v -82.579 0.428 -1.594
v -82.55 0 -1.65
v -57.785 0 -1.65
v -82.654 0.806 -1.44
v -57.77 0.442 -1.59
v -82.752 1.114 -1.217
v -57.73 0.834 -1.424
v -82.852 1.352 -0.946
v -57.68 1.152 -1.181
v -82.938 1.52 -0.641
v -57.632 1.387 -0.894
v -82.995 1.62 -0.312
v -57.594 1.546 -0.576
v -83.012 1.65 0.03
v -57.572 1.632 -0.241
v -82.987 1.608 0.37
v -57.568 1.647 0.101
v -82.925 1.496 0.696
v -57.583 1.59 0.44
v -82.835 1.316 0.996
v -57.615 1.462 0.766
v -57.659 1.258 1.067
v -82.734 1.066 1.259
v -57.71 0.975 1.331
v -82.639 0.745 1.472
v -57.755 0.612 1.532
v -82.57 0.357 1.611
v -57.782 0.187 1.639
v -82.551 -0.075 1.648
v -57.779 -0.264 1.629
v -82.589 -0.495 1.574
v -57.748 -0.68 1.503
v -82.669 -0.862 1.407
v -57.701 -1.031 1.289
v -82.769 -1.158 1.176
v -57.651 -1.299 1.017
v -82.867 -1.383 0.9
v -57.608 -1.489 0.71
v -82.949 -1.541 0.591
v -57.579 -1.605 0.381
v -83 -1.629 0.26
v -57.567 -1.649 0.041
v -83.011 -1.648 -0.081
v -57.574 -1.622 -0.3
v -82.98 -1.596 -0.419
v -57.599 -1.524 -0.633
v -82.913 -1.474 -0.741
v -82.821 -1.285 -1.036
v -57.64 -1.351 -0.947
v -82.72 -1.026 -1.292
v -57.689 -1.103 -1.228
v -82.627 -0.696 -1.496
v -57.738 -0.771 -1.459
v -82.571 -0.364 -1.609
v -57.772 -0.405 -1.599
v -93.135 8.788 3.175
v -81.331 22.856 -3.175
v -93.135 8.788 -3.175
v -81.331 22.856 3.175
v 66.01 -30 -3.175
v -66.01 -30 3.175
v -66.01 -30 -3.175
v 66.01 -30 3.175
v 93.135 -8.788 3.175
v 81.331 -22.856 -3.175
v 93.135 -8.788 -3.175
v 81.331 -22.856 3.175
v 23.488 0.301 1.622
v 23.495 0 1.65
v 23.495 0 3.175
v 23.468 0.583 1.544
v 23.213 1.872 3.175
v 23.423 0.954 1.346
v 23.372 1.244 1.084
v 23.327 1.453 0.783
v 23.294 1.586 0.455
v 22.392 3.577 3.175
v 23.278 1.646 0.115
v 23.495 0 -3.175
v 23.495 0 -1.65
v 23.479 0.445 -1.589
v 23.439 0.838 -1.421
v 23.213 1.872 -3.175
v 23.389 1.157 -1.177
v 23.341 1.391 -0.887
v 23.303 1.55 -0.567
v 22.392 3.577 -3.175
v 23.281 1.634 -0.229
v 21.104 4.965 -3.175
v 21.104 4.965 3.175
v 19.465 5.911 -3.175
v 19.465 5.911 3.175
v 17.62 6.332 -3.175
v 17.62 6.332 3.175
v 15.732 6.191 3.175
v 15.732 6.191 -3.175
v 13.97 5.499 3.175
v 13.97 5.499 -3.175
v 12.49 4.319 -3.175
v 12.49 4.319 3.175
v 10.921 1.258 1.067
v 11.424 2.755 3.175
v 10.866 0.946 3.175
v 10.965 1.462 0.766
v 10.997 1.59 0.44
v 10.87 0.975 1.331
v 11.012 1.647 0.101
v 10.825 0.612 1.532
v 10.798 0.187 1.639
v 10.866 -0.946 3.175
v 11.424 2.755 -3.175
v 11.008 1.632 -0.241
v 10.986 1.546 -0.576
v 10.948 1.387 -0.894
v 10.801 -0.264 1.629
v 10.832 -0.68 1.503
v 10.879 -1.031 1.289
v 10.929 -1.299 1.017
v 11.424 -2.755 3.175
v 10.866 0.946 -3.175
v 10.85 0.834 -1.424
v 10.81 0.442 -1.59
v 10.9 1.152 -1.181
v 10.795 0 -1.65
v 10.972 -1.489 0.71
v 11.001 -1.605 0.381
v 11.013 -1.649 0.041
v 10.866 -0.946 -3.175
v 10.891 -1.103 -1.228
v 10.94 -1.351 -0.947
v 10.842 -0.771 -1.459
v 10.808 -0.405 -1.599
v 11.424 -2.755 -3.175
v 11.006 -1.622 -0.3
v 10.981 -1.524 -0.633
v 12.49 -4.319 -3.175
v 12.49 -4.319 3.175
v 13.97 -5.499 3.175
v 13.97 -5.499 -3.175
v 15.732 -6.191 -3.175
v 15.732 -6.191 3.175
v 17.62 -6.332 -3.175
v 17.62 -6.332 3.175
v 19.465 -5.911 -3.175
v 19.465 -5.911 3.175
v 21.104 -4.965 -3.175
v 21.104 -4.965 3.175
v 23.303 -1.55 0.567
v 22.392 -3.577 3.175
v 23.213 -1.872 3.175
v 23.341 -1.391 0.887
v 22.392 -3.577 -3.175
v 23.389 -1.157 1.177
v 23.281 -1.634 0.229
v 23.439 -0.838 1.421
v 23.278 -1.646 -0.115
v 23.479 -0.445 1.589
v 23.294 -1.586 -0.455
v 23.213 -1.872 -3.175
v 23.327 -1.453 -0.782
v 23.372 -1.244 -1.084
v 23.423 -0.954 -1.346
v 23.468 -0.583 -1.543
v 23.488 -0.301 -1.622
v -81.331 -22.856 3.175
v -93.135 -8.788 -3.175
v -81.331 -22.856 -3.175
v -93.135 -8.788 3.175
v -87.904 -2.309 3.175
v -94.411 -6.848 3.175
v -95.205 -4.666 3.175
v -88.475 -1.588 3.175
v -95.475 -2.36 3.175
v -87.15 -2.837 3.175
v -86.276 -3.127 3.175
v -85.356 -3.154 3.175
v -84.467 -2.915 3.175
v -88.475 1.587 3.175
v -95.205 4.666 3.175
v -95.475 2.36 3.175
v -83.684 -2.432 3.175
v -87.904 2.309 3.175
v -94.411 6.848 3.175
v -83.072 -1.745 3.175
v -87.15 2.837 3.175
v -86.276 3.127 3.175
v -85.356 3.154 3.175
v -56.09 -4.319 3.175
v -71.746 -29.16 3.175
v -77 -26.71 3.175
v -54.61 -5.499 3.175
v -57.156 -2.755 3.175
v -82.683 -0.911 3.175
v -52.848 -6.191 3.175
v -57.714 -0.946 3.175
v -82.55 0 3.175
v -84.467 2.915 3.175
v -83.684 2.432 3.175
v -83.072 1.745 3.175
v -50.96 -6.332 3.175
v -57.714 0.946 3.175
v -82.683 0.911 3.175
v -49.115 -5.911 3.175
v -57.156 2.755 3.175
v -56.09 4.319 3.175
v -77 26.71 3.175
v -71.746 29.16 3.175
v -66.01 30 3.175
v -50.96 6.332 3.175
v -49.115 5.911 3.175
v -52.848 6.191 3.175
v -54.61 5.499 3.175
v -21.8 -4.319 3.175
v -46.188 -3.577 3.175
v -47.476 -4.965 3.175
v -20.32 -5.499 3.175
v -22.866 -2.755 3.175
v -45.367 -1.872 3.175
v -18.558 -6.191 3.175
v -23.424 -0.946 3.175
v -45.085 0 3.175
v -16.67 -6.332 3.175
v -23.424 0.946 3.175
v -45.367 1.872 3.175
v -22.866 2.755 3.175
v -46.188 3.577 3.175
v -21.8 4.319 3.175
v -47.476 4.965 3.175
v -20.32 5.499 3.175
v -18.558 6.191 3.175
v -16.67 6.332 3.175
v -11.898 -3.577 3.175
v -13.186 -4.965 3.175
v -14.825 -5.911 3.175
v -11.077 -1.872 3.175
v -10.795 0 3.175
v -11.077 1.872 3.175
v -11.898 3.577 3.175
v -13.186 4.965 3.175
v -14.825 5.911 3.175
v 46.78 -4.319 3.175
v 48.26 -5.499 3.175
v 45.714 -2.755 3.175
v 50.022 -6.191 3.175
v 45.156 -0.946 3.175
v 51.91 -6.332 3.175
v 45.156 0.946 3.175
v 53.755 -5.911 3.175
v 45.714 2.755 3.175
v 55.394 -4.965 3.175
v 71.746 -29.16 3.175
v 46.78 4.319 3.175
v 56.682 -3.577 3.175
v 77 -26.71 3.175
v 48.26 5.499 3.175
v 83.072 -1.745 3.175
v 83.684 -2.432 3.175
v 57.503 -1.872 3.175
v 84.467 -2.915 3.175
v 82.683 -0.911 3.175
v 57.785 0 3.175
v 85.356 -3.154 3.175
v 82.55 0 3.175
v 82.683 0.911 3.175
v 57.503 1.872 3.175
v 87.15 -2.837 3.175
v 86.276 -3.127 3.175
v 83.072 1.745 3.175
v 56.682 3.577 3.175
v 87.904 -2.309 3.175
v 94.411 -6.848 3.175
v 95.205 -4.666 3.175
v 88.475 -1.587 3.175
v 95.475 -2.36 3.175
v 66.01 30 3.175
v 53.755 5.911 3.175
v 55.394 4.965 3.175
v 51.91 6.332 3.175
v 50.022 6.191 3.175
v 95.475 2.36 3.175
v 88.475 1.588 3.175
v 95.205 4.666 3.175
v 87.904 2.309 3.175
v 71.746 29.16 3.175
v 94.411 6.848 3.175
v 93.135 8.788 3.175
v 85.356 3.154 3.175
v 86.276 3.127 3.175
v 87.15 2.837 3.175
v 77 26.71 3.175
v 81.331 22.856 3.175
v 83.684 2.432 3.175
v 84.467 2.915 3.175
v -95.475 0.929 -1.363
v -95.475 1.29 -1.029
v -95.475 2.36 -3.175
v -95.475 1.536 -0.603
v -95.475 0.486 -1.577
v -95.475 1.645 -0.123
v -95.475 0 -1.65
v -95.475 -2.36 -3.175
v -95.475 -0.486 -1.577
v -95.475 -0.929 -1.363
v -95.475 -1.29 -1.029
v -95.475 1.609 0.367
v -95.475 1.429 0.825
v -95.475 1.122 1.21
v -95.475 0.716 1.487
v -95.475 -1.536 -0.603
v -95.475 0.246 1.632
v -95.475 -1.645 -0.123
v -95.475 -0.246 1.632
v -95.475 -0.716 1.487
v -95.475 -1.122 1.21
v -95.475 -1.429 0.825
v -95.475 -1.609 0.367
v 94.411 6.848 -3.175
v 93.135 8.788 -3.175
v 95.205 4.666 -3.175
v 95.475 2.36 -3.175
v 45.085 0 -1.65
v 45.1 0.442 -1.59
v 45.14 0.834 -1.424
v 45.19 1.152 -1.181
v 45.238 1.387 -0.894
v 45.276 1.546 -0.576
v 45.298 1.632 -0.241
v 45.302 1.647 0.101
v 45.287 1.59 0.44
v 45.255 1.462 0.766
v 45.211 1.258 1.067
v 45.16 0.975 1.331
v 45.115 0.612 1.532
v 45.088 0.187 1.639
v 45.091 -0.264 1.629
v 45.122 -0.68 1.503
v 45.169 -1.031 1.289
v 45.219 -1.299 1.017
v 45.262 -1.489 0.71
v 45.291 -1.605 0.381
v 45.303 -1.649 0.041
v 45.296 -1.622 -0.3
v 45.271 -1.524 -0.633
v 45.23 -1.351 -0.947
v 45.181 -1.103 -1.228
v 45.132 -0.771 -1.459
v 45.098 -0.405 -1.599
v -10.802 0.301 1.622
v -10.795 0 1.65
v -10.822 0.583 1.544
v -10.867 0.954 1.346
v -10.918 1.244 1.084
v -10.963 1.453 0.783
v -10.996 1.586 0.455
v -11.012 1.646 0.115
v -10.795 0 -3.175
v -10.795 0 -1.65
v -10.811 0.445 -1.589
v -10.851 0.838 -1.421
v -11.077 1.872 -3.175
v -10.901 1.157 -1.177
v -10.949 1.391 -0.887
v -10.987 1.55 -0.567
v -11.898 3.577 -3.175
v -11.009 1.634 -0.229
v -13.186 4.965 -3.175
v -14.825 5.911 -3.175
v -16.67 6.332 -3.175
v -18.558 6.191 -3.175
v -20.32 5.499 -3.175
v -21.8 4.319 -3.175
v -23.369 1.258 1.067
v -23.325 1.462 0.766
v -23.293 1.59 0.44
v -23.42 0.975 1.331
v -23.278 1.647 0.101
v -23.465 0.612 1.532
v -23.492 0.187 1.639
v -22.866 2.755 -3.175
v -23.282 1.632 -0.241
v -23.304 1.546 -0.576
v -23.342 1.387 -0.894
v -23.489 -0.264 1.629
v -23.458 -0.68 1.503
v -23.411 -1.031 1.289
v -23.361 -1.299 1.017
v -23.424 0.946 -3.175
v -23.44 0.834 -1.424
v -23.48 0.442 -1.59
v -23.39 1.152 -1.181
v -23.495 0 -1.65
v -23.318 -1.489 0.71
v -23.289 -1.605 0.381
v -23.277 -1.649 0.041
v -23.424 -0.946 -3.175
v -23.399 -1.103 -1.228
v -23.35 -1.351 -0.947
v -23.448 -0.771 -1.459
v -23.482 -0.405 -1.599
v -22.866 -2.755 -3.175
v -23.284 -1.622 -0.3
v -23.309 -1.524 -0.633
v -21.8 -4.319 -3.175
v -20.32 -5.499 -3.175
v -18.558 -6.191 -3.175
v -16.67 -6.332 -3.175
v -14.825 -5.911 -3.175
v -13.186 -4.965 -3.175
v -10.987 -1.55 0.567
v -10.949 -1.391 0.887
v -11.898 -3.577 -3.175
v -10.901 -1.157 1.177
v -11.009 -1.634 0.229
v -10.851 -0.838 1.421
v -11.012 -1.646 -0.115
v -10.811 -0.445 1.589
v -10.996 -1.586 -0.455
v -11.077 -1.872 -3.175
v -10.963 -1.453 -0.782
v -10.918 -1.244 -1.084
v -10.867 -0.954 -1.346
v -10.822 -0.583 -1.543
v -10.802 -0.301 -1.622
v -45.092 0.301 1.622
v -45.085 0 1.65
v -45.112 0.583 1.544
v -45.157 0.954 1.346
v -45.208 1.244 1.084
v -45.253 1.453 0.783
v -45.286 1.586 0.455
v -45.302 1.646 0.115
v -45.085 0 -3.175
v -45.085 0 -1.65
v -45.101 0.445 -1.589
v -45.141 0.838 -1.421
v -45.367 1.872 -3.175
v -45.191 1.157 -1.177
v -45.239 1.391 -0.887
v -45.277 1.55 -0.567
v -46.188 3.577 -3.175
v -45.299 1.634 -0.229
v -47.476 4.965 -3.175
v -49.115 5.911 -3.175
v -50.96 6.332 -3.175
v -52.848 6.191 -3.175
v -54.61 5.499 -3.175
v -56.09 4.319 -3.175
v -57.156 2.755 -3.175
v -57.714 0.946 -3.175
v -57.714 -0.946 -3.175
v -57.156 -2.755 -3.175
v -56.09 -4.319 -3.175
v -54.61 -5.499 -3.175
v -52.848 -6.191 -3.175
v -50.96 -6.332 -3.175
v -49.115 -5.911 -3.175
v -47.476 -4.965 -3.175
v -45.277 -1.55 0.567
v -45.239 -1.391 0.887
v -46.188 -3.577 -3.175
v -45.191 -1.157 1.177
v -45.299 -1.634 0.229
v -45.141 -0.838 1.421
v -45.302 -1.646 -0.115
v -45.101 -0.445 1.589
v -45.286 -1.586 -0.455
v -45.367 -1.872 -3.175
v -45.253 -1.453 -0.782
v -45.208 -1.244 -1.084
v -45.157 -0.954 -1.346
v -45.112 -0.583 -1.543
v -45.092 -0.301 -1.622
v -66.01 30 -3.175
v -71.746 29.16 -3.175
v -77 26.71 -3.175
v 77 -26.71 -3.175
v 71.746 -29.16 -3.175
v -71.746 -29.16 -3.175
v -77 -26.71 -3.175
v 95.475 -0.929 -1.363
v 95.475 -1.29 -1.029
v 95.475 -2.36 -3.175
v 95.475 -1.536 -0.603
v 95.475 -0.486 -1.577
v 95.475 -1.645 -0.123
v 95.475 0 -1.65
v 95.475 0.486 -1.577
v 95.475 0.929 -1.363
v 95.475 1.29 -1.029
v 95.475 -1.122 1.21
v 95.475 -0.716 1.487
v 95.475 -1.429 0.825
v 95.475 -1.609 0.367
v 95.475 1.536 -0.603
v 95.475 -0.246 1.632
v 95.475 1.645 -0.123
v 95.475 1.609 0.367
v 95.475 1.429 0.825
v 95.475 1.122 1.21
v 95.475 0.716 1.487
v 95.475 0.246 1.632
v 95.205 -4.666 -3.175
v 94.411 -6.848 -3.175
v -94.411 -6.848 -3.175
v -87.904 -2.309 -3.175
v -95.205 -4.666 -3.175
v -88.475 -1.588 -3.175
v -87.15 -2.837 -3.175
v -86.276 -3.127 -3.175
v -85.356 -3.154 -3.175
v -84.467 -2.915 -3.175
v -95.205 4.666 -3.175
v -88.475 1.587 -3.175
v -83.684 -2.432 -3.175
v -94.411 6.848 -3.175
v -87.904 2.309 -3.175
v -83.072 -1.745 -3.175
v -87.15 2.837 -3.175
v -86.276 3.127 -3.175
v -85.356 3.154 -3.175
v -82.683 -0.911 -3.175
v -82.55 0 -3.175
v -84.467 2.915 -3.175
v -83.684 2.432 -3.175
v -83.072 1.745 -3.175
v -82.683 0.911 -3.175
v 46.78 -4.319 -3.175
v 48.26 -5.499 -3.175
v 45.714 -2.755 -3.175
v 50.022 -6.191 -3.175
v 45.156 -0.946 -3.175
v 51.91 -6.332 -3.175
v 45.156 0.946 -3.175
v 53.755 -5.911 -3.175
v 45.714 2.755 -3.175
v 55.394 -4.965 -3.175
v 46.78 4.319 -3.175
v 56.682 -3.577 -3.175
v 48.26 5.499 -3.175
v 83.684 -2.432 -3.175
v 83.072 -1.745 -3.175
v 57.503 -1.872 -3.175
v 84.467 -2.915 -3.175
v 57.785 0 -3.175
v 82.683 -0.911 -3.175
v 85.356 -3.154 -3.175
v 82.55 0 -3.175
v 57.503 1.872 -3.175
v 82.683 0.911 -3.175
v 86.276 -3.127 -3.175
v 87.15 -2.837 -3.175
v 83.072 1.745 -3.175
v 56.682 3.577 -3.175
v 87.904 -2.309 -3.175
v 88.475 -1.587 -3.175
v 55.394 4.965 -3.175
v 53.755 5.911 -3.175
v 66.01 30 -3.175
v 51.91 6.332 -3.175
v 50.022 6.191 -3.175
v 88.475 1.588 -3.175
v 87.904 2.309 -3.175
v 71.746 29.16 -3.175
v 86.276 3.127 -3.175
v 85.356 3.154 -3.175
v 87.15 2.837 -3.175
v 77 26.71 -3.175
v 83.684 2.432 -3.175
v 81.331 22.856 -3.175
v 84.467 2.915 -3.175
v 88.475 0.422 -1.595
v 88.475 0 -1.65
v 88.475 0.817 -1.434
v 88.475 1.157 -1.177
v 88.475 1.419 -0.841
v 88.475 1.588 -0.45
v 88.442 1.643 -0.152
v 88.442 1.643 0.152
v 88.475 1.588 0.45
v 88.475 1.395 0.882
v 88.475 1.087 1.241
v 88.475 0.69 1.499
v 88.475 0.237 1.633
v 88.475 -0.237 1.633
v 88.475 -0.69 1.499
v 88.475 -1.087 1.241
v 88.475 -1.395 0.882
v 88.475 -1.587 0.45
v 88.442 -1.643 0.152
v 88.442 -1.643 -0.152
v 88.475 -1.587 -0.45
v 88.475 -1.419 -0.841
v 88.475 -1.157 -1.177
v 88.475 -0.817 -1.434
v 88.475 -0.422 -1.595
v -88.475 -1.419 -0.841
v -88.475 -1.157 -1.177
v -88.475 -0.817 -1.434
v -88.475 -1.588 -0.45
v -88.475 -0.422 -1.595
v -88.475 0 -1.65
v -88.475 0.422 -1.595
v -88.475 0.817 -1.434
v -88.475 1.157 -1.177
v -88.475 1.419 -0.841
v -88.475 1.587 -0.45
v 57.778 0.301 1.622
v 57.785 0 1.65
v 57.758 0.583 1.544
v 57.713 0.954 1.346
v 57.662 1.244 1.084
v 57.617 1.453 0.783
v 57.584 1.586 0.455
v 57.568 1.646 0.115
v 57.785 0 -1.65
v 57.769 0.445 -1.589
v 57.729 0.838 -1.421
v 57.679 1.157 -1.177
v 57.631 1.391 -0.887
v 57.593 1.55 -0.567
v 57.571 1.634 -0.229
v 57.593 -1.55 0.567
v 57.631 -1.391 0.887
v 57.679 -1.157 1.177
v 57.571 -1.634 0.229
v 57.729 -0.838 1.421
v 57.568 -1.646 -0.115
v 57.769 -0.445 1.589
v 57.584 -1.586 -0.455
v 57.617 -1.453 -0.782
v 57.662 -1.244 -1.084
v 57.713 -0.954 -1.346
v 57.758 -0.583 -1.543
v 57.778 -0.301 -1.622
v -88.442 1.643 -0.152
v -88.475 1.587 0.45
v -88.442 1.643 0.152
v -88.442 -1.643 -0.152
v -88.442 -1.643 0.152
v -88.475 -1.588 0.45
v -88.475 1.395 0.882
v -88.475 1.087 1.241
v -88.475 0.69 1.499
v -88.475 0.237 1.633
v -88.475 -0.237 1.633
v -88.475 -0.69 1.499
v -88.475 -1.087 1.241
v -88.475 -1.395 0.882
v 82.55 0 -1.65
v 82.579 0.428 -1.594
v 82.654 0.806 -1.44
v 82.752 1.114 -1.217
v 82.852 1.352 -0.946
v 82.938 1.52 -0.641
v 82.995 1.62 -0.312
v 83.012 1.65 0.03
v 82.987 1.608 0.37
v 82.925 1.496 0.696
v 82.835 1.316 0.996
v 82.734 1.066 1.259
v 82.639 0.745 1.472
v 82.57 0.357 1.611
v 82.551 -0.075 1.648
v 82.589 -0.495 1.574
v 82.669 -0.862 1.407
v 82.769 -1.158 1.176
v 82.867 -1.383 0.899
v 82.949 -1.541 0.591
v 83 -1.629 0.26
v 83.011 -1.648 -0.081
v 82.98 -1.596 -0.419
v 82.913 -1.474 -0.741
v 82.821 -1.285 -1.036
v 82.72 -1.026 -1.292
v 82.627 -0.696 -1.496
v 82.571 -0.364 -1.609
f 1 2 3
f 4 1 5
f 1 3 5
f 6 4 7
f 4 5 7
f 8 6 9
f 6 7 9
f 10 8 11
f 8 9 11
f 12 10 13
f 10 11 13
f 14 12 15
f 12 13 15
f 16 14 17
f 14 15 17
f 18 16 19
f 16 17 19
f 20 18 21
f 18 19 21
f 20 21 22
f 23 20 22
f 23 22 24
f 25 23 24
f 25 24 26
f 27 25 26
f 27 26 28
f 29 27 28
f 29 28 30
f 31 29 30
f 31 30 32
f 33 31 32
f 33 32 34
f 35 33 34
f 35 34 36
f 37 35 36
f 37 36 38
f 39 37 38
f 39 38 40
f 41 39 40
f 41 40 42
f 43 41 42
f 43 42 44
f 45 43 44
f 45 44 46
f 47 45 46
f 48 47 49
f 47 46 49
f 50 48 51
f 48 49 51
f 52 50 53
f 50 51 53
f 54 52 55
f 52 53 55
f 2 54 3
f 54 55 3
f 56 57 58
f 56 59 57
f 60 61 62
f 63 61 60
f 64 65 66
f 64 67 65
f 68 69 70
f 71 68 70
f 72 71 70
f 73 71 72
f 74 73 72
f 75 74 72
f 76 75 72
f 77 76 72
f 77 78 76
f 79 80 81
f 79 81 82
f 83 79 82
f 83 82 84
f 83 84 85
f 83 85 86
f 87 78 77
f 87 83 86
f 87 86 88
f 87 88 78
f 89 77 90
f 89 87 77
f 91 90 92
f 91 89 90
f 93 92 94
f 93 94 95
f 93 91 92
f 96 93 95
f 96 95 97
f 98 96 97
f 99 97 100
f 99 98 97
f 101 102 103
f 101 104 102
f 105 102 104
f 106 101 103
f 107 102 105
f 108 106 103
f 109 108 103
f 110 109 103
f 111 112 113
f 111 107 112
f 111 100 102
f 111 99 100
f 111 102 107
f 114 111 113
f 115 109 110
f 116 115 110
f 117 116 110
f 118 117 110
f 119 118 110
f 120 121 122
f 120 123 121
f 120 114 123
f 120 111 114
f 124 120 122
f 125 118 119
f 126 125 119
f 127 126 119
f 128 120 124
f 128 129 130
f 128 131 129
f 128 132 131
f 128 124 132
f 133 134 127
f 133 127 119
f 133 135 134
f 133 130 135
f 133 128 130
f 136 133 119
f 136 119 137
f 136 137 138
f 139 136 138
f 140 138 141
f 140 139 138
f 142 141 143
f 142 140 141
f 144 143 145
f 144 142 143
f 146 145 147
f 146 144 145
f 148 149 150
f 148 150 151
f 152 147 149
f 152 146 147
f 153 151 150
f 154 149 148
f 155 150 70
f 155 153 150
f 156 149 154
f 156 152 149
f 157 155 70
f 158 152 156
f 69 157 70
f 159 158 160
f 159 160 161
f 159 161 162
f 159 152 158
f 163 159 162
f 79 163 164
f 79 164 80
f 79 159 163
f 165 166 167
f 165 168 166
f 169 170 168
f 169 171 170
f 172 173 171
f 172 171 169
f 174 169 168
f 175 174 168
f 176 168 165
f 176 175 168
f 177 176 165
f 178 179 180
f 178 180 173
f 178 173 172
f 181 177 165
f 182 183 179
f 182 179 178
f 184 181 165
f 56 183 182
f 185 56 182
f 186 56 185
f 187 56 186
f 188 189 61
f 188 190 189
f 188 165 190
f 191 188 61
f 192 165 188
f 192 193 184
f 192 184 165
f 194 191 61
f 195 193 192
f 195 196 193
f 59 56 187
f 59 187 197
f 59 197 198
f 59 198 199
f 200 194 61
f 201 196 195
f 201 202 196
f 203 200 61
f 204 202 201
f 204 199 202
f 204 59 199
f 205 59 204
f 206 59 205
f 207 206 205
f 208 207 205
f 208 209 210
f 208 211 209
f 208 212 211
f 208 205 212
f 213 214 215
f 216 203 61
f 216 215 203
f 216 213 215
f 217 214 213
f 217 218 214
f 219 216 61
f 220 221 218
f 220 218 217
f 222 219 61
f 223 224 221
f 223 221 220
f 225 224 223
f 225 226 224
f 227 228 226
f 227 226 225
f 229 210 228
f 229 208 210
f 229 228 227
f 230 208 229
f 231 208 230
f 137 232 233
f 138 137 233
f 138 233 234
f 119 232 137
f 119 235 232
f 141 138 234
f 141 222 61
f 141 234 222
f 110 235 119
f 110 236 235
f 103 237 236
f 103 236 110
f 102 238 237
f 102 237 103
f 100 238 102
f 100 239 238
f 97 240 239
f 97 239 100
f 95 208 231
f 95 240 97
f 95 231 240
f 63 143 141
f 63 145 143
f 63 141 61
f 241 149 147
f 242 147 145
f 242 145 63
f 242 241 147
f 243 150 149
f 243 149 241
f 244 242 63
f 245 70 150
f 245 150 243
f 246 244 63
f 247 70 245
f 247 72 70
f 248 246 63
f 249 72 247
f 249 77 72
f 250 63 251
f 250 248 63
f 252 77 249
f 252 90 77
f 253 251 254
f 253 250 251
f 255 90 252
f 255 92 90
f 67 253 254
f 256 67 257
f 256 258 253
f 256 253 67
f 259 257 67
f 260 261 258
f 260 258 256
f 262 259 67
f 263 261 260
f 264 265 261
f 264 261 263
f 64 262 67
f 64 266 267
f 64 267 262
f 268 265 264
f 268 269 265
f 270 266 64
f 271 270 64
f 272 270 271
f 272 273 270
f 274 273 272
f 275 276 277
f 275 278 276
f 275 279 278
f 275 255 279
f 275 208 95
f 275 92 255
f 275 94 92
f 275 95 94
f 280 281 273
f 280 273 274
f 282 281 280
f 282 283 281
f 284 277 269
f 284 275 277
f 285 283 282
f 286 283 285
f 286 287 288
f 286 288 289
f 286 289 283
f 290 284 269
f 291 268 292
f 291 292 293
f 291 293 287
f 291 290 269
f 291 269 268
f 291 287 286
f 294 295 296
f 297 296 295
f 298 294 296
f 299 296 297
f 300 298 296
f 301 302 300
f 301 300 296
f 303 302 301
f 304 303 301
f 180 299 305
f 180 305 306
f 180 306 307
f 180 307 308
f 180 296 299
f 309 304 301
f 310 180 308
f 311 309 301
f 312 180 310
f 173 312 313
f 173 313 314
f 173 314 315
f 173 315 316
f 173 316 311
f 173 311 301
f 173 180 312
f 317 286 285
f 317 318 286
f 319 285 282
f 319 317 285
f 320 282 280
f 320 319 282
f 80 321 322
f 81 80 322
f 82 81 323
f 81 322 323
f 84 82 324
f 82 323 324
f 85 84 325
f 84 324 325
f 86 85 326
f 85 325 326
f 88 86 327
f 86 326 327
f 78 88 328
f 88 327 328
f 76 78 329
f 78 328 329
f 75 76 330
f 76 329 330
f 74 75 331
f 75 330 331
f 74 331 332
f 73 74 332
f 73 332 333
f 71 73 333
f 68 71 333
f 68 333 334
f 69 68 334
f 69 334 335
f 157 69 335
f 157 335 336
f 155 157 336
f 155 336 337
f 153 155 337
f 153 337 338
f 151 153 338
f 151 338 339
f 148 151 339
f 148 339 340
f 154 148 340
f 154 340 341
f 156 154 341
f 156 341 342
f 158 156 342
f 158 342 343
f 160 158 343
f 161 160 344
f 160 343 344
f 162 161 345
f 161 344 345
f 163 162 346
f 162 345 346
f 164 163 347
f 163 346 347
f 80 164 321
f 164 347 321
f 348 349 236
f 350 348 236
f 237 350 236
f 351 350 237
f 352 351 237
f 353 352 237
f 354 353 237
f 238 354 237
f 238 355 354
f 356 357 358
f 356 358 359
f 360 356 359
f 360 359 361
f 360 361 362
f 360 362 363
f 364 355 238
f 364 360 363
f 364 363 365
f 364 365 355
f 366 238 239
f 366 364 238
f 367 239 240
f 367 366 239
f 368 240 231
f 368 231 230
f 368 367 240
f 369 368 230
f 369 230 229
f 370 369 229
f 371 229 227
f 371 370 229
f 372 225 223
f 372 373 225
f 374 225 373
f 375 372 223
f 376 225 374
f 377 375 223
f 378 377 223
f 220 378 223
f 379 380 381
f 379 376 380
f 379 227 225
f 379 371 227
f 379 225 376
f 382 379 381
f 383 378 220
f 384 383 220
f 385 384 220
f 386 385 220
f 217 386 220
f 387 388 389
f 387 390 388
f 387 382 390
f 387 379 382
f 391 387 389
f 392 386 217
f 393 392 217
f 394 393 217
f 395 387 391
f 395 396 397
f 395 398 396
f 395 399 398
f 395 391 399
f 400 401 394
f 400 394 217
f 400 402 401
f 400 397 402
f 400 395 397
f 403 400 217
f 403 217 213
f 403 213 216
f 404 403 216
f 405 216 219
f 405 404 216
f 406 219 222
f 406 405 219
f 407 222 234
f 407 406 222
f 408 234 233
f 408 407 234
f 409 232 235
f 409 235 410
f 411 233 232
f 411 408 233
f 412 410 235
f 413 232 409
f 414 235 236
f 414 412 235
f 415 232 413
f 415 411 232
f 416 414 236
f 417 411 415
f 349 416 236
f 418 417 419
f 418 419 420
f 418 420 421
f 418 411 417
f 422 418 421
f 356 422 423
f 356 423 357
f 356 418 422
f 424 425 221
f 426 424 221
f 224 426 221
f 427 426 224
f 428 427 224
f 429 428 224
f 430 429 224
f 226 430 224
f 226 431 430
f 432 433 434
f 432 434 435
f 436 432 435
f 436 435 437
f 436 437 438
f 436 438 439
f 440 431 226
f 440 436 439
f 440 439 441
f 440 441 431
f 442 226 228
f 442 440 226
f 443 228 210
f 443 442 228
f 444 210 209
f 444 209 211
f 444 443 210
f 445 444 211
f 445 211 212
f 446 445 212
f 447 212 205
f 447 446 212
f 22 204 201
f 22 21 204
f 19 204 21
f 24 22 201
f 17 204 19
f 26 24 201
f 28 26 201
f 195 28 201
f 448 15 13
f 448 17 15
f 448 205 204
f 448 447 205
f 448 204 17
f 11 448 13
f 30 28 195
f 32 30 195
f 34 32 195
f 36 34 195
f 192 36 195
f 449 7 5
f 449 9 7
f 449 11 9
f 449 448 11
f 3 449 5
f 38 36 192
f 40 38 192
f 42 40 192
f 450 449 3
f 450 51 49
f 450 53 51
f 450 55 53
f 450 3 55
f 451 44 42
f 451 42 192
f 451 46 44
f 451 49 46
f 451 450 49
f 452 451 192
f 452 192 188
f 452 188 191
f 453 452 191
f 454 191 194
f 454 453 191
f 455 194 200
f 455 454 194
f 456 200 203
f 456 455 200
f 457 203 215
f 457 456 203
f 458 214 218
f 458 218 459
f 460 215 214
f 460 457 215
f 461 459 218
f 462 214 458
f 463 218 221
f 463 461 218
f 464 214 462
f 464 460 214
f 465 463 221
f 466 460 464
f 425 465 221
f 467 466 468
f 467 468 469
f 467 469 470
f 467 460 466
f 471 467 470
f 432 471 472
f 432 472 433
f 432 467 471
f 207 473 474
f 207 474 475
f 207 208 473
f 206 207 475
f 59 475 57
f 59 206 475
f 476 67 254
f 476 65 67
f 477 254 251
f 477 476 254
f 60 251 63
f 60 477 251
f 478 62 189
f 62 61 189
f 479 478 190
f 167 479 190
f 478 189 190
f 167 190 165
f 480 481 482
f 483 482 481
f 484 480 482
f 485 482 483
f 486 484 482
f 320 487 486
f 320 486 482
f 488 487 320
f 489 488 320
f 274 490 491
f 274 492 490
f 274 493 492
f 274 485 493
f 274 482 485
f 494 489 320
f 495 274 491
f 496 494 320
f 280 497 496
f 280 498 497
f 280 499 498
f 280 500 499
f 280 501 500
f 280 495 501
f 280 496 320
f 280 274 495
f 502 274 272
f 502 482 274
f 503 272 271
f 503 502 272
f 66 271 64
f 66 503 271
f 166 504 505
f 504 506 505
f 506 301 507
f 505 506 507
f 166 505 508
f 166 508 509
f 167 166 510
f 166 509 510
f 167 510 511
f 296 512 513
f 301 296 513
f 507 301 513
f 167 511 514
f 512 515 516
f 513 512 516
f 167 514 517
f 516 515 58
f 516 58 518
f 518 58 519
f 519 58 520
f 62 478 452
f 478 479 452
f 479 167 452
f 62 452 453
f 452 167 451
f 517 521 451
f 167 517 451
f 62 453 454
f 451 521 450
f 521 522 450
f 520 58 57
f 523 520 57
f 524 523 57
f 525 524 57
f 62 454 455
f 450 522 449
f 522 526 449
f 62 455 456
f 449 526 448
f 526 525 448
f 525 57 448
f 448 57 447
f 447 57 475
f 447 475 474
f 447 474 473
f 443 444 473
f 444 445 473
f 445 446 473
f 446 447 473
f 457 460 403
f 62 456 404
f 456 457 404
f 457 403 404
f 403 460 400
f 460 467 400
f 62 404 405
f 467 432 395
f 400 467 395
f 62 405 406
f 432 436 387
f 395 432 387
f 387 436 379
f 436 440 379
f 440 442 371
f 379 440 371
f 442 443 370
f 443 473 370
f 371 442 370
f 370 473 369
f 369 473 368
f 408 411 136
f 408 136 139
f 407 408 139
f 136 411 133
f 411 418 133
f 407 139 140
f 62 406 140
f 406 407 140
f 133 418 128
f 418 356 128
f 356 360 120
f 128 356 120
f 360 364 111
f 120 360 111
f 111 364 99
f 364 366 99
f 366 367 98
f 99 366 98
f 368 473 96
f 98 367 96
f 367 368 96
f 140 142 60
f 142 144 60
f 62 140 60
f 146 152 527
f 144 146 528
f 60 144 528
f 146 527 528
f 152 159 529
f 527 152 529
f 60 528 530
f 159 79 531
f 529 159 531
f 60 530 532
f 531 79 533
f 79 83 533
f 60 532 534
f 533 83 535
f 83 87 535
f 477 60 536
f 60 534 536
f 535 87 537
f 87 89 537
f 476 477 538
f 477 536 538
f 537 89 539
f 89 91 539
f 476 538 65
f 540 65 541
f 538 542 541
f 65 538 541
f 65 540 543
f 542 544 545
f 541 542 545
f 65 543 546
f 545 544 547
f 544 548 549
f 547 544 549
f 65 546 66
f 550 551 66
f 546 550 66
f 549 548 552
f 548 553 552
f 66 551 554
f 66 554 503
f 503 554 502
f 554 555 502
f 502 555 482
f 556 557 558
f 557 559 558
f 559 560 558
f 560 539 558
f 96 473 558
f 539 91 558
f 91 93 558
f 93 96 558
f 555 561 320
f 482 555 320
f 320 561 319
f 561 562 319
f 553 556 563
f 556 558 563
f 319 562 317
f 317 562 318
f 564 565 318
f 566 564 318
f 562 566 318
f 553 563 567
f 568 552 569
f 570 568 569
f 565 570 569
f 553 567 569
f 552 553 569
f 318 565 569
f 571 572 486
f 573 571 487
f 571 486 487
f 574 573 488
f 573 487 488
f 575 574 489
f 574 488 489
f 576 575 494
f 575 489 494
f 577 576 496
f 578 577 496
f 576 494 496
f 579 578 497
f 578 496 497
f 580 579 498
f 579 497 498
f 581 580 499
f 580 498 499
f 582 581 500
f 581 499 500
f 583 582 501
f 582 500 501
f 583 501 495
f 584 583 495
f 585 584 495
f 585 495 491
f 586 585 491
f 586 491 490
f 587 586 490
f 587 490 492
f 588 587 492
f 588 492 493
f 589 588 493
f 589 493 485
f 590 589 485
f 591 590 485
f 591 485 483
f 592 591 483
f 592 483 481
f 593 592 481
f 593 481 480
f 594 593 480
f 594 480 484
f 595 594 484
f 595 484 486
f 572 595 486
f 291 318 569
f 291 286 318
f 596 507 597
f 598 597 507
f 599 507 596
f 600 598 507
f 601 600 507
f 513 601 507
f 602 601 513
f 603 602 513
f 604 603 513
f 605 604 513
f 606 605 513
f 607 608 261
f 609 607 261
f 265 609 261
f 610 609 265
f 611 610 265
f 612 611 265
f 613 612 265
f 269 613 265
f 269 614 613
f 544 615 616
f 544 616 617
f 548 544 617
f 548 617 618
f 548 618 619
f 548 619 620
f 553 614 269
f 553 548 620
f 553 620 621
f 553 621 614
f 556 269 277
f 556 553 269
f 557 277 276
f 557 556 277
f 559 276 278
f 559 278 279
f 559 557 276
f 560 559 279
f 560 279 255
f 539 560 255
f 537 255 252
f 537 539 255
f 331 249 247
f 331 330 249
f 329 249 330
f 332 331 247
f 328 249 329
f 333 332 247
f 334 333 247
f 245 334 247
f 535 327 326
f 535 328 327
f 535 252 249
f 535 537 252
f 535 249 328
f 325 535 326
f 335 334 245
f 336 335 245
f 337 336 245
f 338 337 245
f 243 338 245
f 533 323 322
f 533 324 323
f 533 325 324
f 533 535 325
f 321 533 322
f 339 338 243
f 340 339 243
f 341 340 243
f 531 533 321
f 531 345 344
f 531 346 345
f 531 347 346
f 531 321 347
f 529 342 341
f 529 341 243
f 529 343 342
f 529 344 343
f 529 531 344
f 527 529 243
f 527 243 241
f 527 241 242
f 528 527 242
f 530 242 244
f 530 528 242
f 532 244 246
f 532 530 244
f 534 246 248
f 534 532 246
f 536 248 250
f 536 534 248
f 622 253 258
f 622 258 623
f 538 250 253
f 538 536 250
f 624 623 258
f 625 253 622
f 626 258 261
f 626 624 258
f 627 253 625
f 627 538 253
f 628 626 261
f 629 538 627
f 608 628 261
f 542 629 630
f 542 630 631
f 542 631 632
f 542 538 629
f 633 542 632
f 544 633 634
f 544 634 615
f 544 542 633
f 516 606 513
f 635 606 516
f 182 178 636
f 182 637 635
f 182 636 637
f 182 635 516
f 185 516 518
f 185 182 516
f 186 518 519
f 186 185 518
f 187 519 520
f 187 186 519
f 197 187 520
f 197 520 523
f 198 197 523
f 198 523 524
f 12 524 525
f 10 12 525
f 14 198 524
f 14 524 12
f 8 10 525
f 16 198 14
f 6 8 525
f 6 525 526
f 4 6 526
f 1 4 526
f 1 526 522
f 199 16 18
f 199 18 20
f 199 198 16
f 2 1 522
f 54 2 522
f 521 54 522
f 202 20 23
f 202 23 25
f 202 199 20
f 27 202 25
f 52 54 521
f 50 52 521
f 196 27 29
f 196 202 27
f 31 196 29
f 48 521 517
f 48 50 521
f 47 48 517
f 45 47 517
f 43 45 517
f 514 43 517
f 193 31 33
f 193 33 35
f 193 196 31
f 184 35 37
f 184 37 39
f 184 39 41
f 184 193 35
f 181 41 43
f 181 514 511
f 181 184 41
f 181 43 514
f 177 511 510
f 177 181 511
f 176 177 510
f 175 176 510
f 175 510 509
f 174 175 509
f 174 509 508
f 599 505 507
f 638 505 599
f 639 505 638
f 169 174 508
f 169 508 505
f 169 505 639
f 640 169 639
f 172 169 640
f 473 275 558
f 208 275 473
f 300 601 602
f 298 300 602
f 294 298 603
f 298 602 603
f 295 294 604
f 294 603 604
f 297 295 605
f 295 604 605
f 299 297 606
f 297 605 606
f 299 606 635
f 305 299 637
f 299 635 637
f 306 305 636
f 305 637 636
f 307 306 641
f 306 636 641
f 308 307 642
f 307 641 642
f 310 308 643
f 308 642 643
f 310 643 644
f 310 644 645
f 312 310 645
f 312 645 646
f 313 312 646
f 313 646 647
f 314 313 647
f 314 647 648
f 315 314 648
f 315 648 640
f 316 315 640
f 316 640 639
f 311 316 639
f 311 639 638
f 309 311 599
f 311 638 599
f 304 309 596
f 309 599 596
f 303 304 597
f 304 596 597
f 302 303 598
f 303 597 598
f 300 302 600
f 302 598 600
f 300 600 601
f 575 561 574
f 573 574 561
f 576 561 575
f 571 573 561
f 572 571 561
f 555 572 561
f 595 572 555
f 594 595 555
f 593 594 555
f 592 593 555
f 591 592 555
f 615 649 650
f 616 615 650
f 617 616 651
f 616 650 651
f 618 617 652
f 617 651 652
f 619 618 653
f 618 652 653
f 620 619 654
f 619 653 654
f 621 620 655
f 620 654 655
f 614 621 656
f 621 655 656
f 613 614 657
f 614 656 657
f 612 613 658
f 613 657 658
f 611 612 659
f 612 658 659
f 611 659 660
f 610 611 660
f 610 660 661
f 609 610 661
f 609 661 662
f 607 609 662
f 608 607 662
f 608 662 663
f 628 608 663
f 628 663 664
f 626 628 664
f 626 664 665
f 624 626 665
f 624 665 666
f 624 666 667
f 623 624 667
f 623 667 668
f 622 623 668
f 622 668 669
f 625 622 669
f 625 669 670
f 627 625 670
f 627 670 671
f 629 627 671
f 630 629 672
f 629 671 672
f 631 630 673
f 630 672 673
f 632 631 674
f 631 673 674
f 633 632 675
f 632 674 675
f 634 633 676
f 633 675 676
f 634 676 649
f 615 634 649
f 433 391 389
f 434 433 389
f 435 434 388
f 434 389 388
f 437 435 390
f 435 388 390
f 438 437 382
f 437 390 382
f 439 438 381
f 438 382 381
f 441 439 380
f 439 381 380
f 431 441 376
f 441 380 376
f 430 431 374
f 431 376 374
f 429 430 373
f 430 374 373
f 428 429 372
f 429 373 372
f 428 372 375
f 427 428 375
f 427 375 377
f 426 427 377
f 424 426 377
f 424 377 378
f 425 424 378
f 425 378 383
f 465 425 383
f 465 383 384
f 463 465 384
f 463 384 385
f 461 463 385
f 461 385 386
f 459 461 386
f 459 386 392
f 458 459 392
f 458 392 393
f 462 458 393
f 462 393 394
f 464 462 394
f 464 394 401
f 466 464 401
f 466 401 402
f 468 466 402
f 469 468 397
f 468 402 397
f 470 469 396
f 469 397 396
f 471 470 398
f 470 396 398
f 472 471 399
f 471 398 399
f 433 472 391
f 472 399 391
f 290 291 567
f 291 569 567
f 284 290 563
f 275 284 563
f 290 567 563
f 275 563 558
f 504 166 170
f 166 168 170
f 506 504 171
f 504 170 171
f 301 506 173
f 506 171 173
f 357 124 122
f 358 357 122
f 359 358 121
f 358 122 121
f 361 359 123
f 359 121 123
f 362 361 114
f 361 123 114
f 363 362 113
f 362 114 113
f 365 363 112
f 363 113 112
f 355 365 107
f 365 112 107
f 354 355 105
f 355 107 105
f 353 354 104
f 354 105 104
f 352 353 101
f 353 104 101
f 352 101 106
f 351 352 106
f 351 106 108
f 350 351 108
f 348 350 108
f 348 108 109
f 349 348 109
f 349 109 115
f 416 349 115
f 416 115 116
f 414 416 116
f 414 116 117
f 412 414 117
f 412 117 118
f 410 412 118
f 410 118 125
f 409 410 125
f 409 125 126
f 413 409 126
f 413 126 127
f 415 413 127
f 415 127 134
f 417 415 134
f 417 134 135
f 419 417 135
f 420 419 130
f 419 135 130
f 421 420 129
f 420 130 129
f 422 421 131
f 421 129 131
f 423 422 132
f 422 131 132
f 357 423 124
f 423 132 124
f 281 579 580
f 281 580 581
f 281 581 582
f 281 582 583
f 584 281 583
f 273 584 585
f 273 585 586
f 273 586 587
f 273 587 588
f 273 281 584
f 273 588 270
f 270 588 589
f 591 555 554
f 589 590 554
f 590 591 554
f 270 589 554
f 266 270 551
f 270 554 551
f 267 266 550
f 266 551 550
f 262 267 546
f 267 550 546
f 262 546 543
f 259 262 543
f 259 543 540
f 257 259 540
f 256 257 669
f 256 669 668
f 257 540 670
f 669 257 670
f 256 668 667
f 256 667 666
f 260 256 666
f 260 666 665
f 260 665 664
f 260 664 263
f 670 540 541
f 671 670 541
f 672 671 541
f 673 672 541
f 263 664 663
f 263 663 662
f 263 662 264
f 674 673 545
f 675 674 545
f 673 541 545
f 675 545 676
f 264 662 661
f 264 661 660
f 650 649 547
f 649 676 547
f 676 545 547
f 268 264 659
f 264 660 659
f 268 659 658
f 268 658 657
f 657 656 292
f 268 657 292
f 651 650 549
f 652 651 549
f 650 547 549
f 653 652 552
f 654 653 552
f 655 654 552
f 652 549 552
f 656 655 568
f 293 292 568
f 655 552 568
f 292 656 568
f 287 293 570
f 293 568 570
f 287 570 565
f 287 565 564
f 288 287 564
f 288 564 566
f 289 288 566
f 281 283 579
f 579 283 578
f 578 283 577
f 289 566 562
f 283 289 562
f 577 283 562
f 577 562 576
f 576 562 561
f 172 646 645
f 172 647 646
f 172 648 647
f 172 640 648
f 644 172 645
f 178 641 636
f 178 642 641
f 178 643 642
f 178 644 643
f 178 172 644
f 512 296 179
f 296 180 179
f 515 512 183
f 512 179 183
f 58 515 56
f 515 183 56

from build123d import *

# Parameters (mm, degrees)
SKETCH1_R             = 6.35
BOSS_EXTRUDE1_DEPTH   = 3.175
FILLET2_R             = 10
FILLET3_R             = 20
M4X0_7_TAPPED_HOLE1_D = 3.3


with BuildPart() as part:
    # Sketch1 → Boss-Extrude1 (new body, symmetric)
    with BuildSketch(Plane.XY):
        Polygon((75.336239509, 30), (-75.336239509, 30), (-95.474630657, 6), (-95.474630657, -6), (-75.336239509, -30), (75.336239509, -30), (95.474630657, -6), (95.474630657, 6), align=None)
        with BuildLine():
            Line((-88.474630657, -1.5875), (-88.474630657, 1.5875))
            ThreePointArc((-88.474630657, 1.5875), (-82.55, 0), (-88.474630657, -1.5875))
        make_face(mode=Mode.SUBTRACT)
        with Locations((-51.435, 0)):
            Circle(SKETCH1_R, mode=Mode.SUBTRACT)
        with Locations((-17.145, 0)):
            Circle(SKETCH1_R, mode=Mode.SUBTRACT)
        with Locations((17.145, 0)):
            Circle(SKETCH1_R, mode=Mode.SUBTRACT)
        with Locations((51.435, 0)):
            Circle(SKETCH1_R, mode=Mode.SUBTRACT)
        with BuildLine():
            ThreePointArc((88.474630657, -1.5875), (82.55, 0), (88.474630657, 1.5875))
            Line((88.474630657, 1.5875), (88.474630657, -1.5875))
        make_face(mode=Mode.SUBTRACT)
    extrude(amount=BOSS_EXTRUDE1_DEPTH, both=True)

    # Fillet2
    fillet2_edges = [part.edges().sort_by_distance(p)[0] for p in [
        (95.474630657, 6, 0),
        (95.474630657, -6, 0),
        (-95.474630657, -6, 0),
        (-95.474630657, 6, 0),
    ]]
    fillet(fillet2_edges, radius=FILLET2_R)

    # Fillet3
    fillet3_edges = [part.edges().sort_by_distance(p)[0] for p in [
        (75.336239509, -30, 0),
        (-75.336239509, -30, 0),
        (-75.336239509, 30, 0),
        (75.336239509, 30, 0),
    ]]
    fillet(fillet3_edges, radius=FILLET3_R)

    # M4x0.7 Tapped Hole1 (through all)
    with Locations(Plane.ZY.offset(95.474630657)):
        with Locations((0, 0)):
            Hole(M4X0_7_TAPPED_HOLE1_D / 2)


solid = part.part
